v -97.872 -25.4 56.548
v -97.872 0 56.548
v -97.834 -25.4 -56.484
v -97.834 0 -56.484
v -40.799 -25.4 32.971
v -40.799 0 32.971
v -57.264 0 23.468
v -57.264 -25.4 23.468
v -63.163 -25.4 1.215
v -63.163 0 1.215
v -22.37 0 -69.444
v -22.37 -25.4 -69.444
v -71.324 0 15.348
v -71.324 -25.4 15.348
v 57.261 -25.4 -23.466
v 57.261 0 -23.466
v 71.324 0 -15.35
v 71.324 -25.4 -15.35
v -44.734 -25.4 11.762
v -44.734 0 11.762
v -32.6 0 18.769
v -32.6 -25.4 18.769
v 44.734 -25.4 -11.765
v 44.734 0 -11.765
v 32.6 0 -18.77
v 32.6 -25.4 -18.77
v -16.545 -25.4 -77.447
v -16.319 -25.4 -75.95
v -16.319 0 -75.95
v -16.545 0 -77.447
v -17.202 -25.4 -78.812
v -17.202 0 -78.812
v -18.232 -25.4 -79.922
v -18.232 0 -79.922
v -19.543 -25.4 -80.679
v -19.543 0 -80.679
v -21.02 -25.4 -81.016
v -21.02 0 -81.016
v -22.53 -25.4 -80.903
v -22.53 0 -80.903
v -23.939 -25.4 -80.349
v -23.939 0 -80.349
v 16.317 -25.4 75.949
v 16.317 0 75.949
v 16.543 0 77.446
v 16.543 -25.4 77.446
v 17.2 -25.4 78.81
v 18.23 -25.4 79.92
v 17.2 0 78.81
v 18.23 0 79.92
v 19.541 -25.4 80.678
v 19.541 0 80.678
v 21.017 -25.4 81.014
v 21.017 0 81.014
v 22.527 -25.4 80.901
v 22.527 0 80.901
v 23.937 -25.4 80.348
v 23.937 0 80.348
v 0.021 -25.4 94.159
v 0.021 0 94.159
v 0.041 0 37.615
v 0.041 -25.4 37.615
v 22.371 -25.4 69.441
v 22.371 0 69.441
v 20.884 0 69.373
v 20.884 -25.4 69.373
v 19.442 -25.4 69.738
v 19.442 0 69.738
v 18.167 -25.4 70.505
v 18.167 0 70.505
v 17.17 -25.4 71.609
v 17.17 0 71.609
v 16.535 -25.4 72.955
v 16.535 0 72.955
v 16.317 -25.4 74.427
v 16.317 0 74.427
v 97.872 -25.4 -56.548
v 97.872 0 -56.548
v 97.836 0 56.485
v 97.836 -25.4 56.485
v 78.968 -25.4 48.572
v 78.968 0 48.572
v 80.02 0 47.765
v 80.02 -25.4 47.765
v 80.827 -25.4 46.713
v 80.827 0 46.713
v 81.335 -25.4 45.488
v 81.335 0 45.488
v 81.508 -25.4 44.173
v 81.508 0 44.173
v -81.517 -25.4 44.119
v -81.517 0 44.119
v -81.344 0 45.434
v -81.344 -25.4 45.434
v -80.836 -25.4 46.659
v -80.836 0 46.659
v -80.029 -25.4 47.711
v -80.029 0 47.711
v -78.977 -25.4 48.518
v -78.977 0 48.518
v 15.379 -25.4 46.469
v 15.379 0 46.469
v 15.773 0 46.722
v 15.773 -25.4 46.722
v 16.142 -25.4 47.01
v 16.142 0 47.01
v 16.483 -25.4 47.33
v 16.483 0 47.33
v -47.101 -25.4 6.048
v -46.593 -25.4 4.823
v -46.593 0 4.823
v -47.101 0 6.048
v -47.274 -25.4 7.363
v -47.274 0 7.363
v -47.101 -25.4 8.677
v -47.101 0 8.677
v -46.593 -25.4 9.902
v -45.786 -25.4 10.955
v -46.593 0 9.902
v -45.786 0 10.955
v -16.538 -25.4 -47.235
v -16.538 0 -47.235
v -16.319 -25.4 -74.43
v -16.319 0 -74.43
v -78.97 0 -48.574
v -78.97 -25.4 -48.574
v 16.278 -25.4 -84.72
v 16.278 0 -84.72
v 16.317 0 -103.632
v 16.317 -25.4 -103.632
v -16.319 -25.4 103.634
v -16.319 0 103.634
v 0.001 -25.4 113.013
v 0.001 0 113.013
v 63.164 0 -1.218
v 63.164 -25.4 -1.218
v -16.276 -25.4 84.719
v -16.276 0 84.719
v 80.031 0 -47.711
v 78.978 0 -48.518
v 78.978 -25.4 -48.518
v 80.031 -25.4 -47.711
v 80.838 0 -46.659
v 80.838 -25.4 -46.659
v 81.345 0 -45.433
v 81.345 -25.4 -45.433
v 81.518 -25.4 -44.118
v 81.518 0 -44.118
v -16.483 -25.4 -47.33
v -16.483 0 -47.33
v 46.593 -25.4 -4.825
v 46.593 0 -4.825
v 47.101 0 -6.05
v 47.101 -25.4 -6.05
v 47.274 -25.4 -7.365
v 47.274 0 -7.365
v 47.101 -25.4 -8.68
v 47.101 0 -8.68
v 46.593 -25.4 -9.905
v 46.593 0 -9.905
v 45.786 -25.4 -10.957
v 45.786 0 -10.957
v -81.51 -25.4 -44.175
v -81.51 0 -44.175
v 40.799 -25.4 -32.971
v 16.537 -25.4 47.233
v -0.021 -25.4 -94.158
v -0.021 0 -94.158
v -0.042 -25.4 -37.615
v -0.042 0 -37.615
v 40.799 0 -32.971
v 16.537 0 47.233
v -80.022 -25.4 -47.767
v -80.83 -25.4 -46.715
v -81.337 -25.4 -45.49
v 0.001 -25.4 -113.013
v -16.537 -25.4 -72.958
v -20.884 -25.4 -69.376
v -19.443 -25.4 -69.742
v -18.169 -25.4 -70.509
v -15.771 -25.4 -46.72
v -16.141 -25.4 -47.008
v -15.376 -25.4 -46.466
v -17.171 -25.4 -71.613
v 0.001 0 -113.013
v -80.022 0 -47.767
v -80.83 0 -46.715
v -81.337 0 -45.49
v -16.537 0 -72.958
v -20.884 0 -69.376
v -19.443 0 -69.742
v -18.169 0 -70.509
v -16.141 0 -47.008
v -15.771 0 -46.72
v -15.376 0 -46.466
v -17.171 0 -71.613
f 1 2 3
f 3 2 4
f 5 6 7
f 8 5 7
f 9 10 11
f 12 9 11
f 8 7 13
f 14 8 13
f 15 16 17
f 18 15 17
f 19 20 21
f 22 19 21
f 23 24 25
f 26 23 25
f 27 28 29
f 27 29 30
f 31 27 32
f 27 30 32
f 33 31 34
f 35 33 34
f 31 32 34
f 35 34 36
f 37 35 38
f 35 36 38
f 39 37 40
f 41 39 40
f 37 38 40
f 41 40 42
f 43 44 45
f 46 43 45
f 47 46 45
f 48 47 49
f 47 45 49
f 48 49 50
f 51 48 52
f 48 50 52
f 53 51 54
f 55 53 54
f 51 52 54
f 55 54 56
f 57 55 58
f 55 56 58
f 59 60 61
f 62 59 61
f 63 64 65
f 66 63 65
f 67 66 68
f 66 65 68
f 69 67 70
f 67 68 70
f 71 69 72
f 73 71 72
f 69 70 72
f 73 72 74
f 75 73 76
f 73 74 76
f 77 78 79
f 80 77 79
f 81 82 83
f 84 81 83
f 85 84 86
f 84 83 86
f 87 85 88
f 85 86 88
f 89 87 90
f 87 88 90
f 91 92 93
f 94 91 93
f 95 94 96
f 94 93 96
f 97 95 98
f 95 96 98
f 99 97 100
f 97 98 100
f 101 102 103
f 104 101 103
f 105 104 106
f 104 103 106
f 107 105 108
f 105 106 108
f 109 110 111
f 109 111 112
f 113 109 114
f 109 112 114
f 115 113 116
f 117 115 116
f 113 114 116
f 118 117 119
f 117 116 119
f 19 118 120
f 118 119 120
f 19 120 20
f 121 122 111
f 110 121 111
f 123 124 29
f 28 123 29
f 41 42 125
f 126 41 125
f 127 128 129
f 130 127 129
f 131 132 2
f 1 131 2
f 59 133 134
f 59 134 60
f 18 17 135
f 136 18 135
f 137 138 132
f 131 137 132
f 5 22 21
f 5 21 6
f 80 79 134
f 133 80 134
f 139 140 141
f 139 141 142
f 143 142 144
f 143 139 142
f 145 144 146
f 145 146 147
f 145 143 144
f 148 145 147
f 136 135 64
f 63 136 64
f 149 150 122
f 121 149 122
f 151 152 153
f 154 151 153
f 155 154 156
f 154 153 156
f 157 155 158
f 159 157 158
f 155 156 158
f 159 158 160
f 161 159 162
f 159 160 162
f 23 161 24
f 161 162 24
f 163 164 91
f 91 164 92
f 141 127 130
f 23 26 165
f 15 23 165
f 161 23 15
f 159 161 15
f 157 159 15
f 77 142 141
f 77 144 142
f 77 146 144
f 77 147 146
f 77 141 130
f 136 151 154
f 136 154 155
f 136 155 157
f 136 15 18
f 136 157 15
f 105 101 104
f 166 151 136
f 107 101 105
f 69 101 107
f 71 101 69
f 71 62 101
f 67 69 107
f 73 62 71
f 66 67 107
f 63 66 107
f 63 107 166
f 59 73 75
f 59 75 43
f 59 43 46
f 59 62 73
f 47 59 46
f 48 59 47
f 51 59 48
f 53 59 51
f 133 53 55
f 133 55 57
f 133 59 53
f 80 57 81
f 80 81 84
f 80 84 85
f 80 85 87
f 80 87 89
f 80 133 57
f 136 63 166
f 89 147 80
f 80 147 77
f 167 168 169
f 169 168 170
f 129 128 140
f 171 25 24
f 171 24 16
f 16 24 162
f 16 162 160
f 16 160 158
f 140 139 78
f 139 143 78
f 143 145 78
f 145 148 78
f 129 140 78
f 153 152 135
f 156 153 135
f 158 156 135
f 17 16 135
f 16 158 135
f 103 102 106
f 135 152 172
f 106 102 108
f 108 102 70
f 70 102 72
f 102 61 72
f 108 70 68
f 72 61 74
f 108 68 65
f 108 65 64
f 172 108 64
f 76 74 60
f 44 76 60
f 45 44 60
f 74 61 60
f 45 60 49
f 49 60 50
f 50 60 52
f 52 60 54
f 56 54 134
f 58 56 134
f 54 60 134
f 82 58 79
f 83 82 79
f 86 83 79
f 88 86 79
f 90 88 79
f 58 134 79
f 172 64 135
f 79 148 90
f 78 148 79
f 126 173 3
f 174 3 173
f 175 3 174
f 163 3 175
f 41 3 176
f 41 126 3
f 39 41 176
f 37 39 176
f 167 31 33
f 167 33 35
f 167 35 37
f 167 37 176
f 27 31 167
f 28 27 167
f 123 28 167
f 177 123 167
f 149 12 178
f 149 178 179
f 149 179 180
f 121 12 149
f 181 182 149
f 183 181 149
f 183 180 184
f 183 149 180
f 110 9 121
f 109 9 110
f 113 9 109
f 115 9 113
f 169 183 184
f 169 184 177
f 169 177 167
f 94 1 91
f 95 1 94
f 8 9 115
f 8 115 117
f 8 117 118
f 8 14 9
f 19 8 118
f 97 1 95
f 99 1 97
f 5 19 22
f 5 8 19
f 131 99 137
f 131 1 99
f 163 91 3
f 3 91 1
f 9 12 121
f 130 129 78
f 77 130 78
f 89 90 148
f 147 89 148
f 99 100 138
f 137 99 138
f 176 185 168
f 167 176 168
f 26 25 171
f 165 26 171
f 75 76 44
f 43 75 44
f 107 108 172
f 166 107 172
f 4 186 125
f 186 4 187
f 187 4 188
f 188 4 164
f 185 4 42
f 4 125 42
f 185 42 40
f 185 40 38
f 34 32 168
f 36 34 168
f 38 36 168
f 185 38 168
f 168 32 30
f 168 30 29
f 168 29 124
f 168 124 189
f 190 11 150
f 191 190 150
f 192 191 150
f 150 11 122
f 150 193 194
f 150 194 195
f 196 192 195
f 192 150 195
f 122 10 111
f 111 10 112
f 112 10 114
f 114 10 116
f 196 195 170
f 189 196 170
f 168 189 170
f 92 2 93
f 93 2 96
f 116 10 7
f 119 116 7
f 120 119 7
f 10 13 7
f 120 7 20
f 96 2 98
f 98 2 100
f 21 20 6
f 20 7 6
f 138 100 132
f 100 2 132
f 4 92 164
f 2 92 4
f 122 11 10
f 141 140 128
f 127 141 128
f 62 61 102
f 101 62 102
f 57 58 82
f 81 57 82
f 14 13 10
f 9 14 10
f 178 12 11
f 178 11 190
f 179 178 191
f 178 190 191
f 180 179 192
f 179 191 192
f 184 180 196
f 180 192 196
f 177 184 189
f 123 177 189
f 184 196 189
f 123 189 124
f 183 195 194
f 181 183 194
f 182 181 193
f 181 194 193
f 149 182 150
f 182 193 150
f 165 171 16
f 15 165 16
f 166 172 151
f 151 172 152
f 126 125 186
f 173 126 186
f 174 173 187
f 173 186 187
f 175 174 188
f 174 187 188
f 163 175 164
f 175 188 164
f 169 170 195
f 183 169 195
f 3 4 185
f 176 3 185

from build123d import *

# Parameters (mm, degrees)
F1_DEPTH      = 25.4
F2_T1_DEPTH   = 25.4
F2_T3_DEPTH   = 31.626178471
F2_2_T1_DEPTH = 25.4
F2_2_T3_DEPTH = 31.595918111


# Not quite as in the source:
# - a fillet or chamfer that OpenCascade refuses, or shapes differently, is made with other operations: its cross-section is extruded or revolved along the edge and cut away or added


with BuildPart() as f1:
    # F0 (on Front) → F1 (new body)
    with BuildSketch(Plane.XZ):
        Polygon((-16.319119, 103.6338542), (-97.871661, 56.5480962), (-97.834323, -56.4841898), (0.000889, -113.0128042), (-0.021209, -94.1582318), (-0.041783, -37.6147838), (-16.454247, -47.0889838), (-16.483203, -47.3297758), (-16.538321, -47.2350338), (-49.133125, 9.2218002), (-32.599503, 18.7691522), (-40.798877, 32.9710542), (-57.263665, 23.4681522), (-71.323581, 15.3475182), (-63.162815, 1.2154662), (-22.370161, -69.4435238), (-16.319119, -65.9487378), (-16.319119, -84.7493098), (-81.509997, -47.1080338), (-81.517109, 47.0517982), (-16.276447, 84.7189822), align=None)
    extrude(amount=F1_DEPTH)

    # F2: fillet of radius 5.08 on 6 edges, made by hand

    # F2_s2 → F2_t1 (join)
    with BuildSketch(Plane.XZ):
        with BuildLine():
            ThreePointArc((-78.9703857887, -48.5744077693), (-80.8295799283, -46.715177806), (-81.5102184992, -44.1754789968))
            Line((-81.5102184992, -44.1754789968), (-81.509997, -47.1080338))
            Line((-81.509997, -47.1080338), (-78.9703857887, -48.5744077693))
        make_face()
        with BuildLine():
            ThreePointArc((-16.319119, -75.9501053756), (-18.8592026389, -80.3495627147), (-23.939286275, -80.3494178464))
            Line((-23.939286275, -80.3494178464), (-16.319119, -84.7493098))
            Line((-16.319119, -84.7493098), (-16.319119, -75.9501053756))
        make_face()
        with BuildLine():
            ThreePointArc((-22.370161, -69.4435238), (-18.1685225659, -70.5094387585), (-16.319119, -74.4298528539))
            Line((-16.319119, -74.4298528539), (-16.319119, -65.9487378))
            Line((-16.319119, -65.9487378), (-22.370161, -69.4435238))
        make_face()
        with BuildLine():
            ThreePointArc((-81.5168874538, 44.1186213446), (-80.8363993057, 46.6588270036), (-78.9769112502, 48.5184003635))
            Line((-78.9769112502, 48.5184003635), (-81.517109, 47.0517982))
            Line((-81.517109, 47.0517982), (-81.5168874538, 44.1186213446))
        make_face()
        with BuildLine():
            ThreePointArc((-46.5933683691, 4.8227365177), (-47.1008880705, 8.6773378396), (-44.7342717126, 11.7619212171))
            Line((-44.7342717126, 11.7619212171), (-49.133125, 9.2218002))
            Line((-49.133125, 9.2218002), (-46.5933683691, 4.8227365177))
        make_face()
    extrude(amount=F2_T1_DEPTH)

    # F2_s4 → F2_t3 (cut)
    with BuildSketch(Plane.XZ.offset(-3.1130892355)):
        with BuildLine():
            ThreePointArc((-15.3757974258, -46.4664418736), (-15.9594734444, -46.8596619247), (-16.483203, -47.3297758))
            Line((-16.483203, -47.3297758), (-16.454247, -47.0889838))
            Line((-16.454247, -47.0889838), (-15.3757974258, -46.4664418736))
        make_face()
    extrude(amount=F2_T3_DEPTH, mode=Mode.SUBTRACT)


with BuildPart() as f1b:
    # F0 (on Front) → F1, piece 2 (new body)
    with BuildSketch(Plane.XZ):
        Polygon((16.316833, -103.6324318), (97.871661, -56.5476898), (97.836101, 56.4845962), (0.000889, 113.0128042), (0.021463, 94.1586382), (0.040767, 37.6151902), (16.451707, 47.0888822), (16.483457, 47.3301822), (16.537305, 47.2326462), (49.133379, -9.2246958), (32.599757, -18.7700158), (40.799131, -32.9709018), (57.261125, -23.4664758), (71.323835, -15.3499058), (63.164339, -1.2178538), (22.370669, 69.4408822), (16.316833, 65.9488902), (16.316833, 84.7479382), (81.507711, 47.1056462), (81.518633, -47.0516458), (16.278225, -84.7203538), align=None)
    extrude(amount=F1_DEPTH)

    # F2#2: fillet of radius 5.08 on 6 edges, made by hand

    # F2_2_s2 → F2_2_t1 (join)
    with BuildSketch(Plane.XZ):
        with BuildLine():
            ThreePointArc((46.5932982219, -4.8252024991), (47.1007988179, -8.6800552118), (44.7338290233, -11.7646784114))
            Line((44.7338290233, -11.7646784114), (49.133379, -9.2246958))
            Line((49.133379, -9.2246958), (46.5932982219, -4.8252024991))
        make_face()
        with BuildLine():
            ThreePointArc((16.316833, 75.9486150149), (18.8569423497, 80.3480871974), (23.9370516947, 80.3478977955))
            Line((23.9370516947, 80.3478977955), (16.316833, 84.7479382))
            Line((16.316833, 84.7479382), (16.316833, 75.9486150149))
        make_face()
        with BuildLine():
            ThreePointArc((22.370669, 69.4408822), (18.1673351195, 70.505347241), (16.316833, 74.4266663354))
            Line((16.316833, 74.4266663354), (16.316833, 65.9488902))
            Line((16.316833, 65.9488902), (22.370669, 69.4408822))
        make_face()
        with BuildLine():
            ThreePointArc((78.968269877, 48.5719615374), (80.8273760471, 46.7128245665), (81.5080511482, 44.1732680235))
            Line((81.5080511482, 44.1732680235), (81.507711, 47.1056462))
            Line((81.507711, 47.1056462), (78.968269877, 48.5719615374))
        make_face()
        with BuildLine():
            ThreePointArc((78.9784010584, -48.5183327536), (80.8378803981, -46.6586769125), (81.5182927508, -44.1183969491))
            Line((81.5182927508, -44.1183969491), (81.518633, -47.0516458))
            Line((81.518633, -47.0516458), (78.9784010584, -48.5183327536))
        make_face()
    extrude(amount=F2_2_T1_DEPTH)

    # F2_2_s4 → F2_2_t3 (cut)
    with BuildSketch(Plane.XZ.offset(-3.0979590555)):
        with BuildLine():
            ThreePointArc((15.3785094128, 46.4693477068), (15.9607949827, 46.861499235), (16.483457, 47.3301822))
            Line((16.483457, 47.3301822), (16.451707, 47.0888822))
            Line((16.451707, 47.0888822), (15.3785094128, 46.4693477068))
        make_face()
    extrude(amount=F2_2_T3_DEPTH, mode=Mode.SUBTRACT)


solid = Compound([f1.part, f1b.part])
